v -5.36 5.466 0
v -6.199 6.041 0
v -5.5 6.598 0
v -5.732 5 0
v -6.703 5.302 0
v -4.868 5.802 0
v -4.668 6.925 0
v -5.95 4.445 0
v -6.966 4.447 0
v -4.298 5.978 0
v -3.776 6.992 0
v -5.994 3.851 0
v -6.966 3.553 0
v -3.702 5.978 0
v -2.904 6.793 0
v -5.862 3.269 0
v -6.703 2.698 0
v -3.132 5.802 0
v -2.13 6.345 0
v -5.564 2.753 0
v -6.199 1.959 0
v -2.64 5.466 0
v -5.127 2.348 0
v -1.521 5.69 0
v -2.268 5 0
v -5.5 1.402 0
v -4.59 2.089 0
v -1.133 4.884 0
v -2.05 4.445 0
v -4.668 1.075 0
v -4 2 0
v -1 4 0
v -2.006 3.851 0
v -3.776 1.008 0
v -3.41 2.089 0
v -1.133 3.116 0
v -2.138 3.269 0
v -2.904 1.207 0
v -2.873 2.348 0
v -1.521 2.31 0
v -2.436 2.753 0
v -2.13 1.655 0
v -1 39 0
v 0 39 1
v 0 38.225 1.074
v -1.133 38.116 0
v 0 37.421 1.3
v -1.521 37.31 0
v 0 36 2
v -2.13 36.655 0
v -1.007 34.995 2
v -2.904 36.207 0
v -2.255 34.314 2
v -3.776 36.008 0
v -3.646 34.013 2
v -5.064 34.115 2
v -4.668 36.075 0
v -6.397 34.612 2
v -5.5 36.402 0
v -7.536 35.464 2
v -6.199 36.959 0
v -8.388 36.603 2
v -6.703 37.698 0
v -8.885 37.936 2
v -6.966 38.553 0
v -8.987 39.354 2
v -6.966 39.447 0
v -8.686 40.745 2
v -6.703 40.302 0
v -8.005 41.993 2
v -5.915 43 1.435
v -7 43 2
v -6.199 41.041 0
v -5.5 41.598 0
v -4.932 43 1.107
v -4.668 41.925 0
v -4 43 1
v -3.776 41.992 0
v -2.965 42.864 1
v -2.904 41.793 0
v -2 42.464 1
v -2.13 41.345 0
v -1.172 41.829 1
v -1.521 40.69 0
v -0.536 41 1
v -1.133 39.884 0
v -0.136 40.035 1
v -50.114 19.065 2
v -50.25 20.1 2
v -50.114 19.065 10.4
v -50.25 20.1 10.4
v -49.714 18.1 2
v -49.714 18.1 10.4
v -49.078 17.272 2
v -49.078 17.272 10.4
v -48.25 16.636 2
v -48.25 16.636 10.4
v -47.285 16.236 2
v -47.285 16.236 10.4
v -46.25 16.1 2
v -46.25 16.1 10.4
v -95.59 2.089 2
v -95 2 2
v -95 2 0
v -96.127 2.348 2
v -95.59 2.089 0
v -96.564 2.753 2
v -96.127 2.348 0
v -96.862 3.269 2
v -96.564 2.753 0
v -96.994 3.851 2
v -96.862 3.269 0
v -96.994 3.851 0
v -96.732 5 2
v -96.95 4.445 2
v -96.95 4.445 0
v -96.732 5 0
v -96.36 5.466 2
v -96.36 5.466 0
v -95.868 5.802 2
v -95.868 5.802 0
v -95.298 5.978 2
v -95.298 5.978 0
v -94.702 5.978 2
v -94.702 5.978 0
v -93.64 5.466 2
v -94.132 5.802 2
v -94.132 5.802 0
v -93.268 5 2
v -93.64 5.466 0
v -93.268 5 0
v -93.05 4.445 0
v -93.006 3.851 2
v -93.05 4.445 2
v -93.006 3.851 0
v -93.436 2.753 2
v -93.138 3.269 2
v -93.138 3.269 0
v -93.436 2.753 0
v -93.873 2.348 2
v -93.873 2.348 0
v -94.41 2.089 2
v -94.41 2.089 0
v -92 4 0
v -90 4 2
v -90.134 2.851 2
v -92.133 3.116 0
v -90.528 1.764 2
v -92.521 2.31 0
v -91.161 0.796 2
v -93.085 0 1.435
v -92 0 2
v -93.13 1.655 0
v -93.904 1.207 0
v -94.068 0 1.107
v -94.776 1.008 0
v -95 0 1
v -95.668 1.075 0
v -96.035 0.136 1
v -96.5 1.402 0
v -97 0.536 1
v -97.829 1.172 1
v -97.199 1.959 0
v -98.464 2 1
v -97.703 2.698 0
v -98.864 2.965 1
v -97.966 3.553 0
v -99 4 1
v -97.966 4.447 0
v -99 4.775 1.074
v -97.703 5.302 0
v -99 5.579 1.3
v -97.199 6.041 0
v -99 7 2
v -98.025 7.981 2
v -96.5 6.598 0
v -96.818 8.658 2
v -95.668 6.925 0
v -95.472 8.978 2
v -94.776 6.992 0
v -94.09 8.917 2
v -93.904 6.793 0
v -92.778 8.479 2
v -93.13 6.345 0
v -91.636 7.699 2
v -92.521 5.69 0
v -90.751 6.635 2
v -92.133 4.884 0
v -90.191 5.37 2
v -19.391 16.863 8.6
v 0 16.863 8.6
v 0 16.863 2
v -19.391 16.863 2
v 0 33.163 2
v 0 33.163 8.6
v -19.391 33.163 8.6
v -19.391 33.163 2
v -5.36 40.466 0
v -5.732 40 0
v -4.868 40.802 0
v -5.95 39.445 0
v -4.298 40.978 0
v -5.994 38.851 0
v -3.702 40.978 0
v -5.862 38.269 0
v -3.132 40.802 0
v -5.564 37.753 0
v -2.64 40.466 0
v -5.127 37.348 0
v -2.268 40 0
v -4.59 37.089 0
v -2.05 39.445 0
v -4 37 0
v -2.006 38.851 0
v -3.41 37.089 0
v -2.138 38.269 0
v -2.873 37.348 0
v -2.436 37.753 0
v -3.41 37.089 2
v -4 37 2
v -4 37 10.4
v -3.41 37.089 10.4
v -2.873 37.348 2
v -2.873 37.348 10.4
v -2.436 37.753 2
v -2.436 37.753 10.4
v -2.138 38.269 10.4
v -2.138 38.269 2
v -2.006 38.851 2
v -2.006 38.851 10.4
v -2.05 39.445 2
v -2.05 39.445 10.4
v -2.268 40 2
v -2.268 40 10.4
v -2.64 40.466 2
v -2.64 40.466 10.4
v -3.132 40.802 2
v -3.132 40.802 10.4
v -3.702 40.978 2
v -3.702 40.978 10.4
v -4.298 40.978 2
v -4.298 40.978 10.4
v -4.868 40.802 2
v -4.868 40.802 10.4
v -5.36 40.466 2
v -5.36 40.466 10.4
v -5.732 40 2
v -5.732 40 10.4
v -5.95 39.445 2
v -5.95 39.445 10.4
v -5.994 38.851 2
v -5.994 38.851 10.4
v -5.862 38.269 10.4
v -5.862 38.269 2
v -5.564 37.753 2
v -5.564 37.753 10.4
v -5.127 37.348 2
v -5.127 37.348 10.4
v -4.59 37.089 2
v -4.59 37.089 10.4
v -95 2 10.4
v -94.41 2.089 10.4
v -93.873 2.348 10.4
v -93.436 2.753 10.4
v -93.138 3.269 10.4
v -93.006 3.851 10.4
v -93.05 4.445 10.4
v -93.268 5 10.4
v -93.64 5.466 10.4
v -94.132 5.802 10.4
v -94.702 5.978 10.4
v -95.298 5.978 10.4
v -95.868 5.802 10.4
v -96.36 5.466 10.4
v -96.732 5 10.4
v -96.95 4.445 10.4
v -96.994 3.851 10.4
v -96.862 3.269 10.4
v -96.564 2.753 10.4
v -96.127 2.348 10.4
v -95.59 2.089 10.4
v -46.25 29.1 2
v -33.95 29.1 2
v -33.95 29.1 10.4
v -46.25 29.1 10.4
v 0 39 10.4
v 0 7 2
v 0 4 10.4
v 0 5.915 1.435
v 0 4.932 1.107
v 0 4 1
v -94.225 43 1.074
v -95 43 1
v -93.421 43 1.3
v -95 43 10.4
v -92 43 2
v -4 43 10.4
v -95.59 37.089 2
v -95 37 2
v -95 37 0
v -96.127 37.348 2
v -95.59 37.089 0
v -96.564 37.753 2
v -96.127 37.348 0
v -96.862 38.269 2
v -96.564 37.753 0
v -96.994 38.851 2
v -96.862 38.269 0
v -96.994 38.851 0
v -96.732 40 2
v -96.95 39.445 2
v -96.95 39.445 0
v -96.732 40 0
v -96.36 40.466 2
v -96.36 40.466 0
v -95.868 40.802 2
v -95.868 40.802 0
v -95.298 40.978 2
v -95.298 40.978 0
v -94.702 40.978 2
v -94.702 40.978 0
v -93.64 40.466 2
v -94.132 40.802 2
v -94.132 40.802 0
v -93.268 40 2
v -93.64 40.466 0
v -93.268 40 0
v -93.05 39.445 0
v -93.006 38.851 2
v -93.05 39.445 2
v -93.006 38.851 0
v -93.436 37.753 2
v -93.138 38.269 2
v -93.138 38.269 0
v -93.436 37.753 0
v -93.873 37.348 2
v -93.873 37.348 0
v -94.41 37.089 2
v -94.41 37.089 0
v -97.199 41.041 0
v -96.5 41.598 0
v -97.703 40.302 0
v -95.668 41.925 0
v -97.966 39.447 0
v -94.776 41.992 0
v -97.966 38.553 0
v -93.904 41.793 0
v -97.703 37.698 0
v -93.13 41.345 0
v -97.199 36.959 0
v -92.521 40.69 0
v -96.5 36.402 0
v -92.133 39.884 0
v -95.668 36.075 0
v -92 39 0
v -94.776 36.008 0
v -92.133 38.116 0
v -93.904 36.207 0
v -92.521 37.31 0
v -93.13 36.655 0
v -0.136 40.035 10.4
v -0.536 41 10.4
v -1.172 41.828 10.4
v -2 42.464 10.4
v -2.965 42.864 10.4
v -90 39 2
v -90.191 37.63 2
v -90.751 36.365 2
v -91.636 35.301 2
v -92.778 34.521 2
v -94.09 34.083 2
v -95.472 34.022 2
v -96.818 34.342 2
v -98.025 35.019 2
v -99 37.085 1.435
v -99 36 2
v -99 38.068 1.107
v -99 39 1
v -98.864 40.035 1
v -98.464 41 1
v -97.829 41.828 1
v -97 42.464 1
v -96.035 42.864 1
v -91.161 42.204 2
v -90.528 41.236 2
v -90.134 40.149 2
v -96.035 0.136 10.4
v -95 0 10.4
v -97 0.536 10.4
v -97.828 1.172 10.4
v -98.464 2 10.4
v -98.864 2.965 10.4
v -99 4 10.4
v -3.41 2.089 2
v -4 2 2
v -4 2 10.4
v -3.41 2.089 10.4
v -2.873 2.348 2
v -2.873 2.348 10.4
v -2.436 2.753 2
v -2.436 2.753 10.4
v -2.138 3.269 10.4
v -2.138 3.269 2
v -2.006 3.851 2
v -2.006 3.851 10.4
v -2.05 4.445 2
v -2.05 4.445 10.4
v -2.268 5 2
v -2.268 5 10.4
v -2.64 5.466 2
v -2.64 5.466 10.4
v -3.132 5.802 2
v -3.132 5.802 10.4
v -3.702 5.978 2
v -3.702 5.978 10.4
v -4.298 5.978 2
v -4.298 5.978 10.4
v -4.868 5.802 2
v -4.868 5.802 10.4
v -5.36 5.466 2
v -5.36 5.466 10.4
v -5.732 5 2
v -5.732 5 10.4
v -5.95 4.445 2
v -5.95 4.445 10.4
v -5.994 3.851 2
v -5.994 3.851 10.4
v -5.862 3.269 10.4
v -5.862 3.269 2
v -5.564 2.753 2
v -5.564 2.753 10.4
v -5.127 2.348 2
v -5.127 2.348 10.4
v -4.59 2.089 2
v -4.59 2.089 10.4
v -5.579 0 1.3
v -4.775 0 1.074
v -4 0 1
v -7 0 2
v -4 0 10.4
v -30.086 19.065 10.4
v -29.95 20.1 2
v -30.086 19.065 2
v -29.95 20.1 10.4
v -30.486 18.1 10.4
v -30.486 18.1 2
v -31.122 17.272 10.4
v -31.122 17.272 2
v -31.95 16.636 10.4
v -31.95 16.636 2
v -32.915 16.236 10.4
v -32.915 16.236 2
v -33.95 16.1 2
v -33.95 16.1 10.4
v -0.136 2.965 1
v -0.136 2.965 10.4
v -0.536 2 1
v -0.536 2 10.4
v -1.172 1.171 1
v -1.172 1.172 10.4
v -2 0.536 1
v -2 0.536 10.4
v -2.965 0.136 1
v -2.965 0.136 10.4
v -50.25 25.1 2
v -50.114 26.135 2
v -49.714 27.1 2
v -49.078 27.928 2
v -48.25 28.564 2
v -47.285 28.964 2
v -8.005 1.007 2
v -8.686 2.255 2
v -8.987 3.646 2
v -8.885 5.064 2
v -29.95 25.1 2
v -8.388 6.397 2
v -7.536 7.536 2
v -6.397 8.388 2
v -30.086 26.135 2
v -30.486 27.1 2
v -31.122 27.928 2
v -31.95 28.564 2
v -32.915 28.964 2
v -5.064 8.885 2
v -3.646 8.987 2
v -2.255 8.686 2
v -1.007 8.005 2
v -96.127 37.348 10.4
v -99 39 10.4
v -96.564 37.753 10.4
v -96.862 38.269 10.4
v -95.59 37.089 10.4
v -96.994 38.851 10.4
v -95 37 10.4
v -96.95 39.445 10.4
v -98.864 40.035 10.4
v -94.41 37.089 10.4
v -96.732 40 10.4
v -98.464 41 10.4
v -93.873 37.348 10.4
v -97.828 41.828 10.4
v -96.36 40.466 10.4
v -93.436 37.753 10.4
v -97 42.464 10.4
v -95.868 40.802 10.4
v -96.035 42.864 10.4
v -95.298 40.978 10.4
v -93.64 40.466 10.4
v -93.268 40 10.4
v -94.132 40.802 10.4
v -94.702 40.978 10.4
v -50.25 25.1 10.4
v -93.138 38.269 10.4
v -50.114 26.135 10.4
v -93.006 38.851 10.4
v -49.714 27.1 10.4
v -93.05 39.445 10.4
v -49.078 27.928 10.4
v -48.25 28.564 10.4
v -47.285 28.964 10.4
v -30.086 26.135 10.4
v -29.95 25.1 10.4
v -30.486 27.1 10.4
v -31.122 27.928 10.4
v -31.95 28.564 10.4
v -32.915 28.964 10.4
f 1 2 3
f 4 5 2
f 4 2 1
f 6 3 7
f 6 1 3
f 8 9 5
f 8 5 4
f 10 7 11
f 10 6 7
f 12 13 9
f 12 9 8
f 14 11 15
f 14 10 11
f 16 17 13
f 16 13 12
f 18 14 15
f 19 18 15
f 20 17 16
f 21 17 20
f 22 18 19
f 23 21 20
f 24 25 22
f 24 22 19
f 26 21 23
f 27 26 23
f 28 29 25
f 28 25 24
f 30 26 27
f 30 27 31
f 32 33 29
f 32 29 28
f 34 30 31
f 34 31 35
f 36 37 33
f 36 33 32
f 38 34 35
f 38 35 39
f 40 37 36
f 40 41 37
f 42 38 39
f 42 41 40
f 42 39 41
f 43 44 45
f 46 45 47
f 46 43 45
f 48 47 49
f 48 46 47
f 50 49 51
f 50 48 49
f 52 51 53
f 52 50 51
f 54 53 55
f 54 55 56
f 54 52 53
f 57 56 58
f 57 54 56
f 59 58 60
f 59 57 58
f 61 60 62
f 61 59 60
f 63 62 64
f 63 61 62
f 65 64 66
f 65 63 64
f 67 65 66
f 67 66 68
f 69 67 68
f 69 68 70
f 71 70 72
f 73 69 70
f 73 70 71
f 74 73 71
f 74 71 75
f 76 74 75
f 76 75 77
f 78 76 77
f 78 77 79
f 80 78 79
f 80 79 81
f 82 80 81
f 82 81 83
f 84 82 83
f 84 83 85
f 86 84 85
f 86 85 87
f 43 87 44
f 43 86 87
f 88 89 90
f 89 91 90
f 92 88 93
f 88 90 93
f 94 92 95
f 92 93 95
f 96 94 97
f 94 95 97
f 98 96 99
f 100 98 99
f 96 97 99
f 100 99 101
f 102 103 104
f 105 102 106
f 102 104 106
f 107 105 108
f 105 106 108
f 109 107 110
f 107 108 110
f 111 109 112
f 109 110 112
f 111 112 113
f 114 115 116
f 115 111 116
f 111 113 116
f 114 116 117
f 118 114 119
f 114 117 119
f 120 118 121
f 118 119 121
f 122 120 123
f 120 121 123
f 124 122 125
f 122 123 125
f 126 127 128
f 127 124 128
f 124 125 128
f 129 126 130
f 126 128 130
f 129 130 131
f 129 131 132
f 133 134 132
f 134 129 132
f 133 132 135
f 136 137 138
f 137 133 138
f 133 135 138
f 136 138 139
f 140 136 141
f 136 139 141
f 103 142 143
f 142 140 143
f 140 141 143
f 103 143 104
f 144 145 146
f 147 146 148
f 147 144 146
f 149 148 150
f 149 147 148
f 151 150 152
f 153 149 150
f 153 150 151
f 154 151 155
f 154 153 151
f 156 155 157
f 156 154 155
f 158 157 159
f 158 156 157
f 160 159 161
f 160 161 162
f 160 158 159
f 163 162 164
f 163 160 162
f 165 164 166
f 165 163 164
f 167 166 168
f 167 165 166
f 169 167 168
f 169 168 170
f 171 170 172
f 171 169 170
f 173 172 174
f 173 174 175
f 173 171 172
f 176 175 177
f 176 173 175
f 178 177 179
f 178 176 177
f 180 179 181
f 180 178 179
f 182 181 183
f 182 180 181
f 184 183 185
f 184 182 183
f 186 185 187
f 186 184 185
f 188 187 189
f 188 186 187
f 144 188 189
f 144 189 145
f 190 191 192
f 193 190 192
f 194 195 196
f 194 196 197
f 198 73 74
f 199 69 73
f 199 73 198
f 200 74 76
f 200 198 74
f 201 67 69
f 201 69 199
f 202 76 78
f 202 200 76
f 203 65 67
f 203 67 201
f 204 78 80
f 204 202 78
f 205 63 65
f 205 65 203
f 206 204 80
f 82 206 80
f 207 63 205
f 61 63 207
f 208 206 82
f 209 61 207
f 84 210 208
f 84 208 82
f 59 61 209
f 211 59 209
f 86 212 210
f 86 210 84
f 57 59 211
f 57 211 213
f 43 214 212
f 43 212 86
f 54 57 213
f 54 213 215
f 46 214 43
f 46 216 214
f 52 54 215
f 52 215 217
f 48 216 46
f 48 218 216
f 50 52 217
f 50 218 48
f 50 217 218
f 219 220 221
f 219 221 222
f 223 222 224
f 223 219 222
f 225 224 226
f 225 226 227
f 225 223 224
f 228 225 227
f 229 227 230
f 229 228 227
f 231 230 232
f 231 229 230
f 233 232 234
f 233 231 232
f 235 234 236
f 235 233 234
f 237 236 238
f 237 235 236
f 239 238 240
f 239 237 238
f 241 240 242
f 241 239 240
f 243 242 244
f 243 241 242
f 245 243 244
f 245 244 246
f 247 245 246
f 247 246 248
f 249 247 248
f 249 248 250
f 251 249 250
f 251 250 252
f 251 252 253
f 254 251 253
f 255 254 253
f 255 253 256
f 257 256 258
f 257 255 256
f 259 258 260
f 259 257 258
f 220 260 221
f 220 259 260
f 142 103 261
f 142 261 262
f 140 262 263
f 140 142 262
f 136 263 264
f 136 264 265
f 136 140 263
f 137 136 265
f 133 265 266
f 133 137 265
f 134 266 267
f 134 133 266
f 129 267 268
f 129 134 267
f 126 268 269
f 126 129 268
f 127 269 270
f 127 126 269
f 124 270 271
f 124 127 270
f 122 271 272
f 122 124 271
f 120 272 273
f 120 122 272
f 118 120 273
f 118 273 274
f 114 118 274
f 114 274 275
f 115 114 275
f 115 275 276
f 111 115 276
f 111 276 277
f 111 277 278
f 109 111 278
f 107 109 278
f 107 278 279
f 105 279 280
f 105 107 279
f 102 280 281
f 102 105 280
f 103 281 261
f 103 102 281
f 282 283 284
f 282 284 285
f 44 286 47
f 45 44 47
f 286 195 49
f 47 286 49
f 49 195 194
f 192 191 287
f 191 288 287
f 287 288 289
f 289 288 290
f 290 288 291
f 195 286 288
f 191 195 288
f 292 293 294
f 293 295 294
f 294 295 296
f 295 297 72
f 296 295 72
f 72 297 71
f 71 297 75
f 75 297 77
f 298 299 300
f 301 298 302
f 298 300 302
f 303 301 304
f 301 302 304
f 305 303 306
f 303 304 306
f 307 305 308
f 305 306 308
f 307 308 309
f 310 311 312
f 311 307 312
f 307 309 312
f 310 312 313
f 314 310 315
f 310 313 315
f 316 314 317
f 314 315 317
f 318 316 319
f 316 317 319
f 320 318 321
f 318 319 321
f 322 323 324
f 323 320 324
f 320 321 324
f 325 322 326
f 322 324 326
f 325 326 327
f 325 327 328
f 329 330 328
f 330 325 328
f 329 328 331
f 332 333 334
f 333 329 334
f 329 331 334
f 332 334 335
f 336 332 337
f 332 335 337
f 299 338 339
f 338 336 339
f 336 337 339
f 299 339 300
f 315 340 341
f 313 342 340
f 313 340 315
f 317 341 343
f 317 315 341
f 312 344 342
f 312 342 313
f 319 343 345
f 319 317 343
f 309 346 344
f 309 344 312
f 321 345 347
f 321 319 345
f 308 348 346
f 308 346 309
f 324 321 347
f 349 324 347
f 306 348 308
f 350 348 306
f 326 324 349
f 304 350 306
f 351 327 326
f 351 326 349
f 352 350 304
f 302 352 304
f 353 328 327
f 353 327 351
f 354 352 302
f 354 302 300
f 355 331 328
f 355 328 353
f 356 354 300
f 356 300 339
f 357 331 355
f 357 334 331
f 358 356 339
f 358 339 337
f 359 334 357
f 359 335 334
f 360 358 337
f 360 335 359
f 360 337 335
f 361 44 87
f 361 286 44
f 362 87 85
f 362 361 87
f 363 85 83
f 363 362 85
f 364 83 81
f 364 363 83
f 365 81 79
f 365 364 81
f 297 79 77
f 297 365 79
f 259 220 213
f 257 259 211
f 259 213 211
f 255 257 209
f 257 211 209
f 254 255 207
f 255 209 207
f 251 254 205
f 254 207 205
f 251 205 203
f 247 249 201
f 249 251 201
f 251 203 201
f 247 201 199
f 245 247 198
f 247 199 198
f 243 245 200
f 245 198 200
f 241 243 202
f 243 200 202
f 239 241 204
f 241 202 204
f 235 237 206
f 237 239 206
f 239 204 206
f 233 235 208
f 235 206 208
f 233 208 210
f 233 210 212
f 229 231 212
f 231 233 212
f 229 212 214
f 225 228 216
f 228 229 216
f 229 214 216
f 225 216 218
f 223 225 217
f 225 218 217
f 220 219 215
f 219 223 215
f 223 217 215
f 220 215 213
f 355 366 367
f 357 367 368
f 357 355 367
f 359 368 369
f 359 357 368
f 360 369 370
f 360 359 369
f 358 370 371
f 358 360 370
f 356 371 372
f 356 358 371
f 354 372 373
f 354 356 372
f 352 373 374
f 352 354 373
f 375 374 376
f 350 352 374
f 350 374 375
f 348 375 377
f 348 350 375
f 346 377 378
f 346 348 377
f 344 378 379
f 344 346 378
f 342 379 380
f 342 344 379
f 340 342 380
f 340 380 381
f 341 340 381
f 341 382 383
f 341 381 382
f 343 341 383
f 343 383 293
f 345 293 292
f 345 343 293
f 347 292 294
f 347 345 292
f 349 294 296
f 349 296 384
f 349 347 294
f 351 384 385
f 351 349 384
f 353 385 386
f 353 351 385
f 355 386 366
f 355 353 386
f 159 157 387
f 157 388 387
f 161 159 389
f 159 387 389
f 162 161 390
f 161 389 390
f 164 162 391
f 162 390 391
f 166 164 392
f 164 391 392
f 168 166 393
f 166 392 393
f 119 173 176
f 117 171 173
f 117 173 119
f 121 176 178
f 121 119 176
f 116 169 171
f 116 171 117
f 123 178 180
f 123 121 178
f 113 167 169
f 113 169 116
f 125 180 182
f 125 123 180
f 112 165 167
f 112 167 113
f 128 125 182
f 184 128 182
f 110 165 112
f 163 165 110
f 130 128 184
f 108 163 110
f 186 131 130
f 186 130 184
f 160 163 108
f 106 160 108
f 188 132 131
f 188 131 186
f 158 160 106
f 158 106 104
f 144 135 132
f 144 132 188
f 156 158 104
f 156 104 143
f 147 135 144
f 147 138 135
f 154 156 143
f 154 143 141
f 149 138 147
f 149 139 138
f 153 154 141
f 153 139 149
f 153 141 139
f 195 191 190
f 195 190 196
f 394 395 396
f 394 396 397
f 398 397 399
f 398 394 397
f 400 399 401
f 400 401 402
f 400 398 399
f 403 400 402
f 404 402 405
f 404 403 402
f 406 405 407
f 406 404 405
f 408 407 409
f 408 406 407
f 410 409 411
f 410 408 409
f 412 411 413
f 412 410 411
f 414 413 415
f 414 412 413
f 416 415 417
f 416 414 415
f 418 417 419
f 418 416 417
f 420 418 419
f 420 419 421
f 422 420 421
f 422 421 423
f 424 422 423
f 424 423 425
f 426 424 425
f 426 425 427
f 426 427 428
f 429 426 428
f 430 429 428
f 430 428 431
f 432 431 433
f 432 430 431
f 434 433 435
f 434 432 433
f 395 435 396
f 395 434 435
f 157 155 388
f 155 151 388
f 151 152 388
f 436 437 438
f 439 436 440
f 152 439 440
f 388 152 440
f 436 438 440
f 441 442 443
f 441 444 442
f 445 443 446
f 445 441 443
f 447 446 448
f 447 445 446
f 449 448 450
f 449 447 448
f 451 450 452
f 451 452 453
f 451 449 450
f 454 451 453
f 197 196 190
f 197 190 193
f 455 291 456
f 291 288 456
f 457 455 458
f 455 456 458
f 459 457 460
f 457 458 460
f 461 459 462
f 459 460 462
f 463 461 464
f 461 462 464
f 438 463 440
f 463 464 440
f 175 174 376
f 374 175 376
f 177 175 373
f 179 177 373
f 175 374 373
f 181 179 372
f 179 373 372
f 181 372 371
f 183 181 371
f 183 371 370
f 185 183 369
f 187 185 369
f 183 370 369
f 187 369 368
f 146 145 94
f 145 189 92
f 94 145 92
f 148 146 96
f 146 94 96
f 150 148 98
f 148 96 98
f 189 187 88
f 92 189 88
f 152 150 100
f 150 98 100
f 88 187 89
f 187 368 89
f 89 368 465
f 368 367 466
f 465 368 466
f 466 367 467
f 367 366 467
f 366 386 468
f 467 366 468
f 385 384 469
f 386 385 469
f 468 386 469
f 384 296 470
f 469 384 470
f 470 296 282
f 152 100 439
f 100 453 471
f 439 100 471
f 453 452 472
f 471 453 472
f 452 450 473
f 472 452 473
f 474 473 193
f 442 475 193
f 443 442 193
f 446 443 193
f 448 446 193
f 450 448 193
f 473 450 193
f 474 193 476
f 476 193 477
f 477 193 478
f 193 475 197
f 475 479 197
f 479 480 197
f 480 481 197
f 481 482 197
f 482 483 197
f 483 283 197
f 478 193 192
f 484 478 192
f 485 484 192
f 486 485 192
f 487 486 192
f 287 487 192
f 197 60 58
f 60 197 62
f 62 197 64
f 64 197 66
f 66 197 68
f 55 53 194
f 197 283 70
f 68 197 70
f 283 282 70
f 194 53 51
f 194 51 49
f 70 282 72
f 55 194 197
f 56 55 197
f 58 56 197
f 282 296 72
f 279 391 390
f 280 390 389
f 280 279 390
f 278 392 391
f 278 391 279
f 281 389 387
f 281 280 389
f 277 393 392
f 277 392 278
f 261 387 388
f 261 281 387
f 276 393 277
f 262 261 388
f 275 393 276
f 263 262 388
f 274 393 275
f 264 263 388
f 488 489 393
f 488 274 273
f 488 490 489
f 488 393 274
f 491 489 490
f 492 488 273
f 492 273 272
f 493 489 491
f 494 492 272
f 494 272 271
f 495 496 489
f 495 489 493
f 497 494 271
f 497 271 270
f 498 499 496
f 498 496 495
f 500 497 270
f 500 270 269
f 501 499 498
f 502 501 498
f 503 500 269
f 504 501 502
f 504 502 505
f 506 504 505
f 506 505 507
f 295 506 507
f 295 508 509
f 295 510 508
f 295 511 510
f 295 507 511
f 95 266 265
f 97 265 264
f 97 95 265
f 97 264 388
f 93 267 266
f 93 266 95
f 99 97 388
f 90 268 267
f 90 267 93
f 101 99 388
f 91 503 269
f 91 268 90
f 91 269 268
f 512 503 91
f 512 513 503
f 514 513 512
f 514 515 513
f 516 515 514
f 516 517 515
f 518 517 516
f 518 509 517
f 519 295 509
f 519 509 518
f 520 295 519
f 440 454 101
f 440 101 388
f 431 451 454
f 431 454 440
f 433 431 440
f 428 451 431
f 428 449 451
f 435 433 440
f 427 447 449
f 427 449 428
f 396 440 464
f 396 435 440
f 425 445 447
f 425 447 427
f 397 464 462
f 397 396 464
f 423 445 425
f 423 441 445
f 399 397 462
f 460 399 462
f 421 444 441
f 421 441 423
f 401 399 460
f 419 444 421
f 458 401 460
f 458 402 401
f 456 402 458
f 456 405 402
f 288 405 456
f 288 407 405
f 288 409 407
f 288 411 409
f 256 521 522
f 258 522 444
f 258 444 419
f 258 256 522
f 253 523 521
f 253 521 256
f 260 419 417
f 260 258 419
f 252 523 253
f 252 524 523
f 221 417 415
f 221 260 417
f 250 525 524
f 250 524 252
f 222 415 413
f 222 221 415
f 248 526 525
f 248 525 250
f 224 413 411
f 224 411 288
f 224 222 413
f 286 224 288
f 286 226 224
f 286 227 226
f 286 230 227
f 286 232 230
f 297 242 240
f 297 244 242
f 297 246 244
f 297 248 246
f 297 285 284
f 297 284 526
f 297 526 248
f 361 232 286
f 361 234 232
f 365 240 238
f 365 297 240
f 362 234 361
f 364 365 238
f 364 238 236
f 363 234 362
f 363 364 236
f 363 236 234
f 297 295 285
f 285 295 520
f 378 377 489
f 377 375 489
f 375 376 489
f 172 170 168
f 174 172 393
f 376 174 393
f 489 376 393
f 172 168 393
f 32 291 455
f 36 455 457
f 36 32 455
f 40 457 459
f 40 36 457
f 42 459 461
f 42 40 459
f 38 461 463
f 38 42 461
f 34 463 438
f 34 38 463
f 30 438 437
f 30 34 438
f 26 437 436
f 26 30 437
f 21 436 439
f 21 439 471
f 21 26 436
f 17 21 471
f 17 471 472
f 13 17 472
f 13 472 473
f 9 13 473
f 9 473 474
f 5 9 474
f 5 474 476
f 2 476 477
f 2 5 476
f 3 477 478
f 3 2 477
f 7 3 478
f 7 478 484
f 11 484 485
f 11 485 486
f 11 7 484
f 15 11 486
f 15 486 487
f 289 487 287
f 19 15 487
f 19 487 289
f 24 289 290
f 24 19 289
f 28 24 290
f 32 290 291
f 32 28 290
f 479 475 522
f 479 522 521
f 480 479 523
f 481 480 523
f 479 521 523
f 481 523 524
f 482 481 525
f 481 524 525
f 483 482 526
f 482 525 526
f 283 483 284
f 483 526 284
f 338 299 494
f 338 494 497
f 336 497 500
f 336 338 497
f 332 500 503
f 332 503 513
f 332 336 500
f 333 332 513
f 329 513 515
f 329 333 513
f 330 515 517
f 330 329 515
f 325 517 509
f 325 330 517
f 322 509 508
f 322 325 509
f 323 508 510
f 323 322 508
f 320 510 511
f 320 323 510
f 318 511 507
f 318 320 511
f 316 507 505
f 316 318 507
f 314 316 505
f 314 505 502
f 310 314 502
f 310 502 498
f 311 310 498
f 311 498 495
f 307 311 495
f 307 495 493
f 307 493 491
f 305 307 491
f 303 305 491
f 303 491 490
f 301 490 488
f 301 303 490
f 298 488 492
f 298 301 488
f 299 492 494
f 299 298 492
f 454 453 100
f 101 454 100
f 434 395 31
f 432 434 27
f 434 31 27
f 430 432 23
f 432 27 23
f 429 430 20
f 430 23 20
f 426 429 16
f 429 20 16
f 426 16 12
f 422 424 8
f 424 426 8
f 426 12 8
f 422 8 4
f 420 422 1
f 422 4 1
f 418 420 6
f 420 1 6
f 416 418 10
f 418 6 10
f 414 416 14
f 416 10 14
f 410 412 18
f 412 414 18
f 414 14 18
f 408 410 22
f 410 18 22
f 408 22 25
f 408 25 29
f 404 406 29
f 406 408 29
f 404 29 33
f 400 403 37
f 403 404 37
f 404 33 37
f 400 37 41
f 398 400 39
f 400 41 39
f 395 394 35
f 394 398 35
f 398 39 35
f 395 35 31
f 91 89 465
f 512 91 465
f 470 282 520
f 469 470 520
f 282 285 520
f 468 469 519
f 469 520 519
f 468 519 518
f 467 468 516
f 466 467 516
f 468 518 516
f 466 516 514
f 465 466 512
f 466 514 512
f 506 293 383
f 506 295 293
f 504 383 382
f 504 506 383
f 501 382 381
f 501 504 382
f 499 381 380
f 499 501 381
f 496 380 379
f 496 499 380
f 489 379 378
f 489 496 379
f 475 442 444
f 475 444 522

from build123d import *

# Parameters (mm, degrees)
SKETCH3_W           = 99
SKETCH3_H           = 43
SKETCH3_R           = 2
BOSS_EXTRUDE2_DEPTH = 8.399995141
BOSS_EXTRUDE3_START = 2
SKETCH4_R           = 3
SKETCH4_R_2         = 2
BOSS_EXTRUDE3_DEPTH = 2
CHAMFER1_SIZE       = 2
SKETCH5_W           = 8.599999433
SKETCH5_H           = 16.3
CUT_EXTRUDE1_DEPTH  = 19.390997243
CUT_EXTRUDE2_REACH  = 110.262
SKETCH6_W           = 20.299990895
SKETCH6_H           = 13.000003078
FILLET1_R           = 4


# Some blends are built 0.0001 mm under size
with BuildPart() as part:
    # Sketch3 → Boss-Extrude2 (new body)
    with BuildSketch(Plane.XY.offset(2)):
        with Locations((-49.5, 21.5)):
            Rectangle(SKETCH3_W, SKETCH3_H)
        with Locations(Location((-95, 39, 0), (0, 0, 270))):
            Circle(SKETCH3_R, mode=Mode.SUBTRACT)
        with Locations(Location((-95, 4, 0), (0, 0, 270))):
            Circle(SKETCH3_R, mode=Mode.SUBTRACT)
        with Locations(Location((-4, 4, 0), (0, 0, 270))):
            Circle(SKETCH3_R, mode=Mode.SUBTRACT)
        with Locations(Location((-4, 39, 0), (0, 0, 270))):
            Circle(SKETCH3_R, mode=Mode.SUBTRACT)
    extrude(amount=BOSS_EXTRUDE2_DEPTH)

    # Sketch4 → Boss-Extrude3 (add)
    # profile 1 of 4: a face of its own
    with BuildSketch(Plane(origin=(0, 0, 2), x_dir=(-1, 0, 0), z_dir=(0, 0, -1)).offset(BOSS_EXTRUDE3_START)):
        with Locations(Location((4, 39, 0), (0, 0, 180))):
            Circle(SKETCH4_R)
        with Locations(Location((4, 39, 0), (0, 0, 270))):
            Circle(SKETCH4_R_2, mode=Mode.SUBTRACT)
    # profile 2 of 4: a face of its own
    with BuildSketch(Plane(origin=(0, 0, 2), x_dir=(-1, 0, 0), z_dir=(0, 0, -1)).offset(BOSS_EXTRUDE3_START)):
        with Locations(Location((95, 39, 0), (0, 0, 180))):
            Circle(SKETCH4_R)
        with Locations(Location((95, 39, 0), (0, 0, 270))):
            Circle(SKETCH4_R_2, mode=Mode.SUBTRACT)
    # profile 3 of 4: a face of its own
    with BuildSketch(Plane(origin=(0, 0, 2), x_dir=(-1, 0, 0), z_dir=(0, 0, -1)).offset(BOSS_EXTRUDE3_START)):
        with Locations(Location((95, 4, 0), (0, 0, 180))):
            Circle(SKETCH4_R)
        with Locations(Location((95, 4, 0), (0, 0, 270))):
            Circle(SKETCH4_R_2, mode=Mode.SUBTRACT)
    # profile 4 of 4: a face of its own
    with BuildSketch(Plane(origin=(0, 0, 2), x_dir=(-1, 0, 0), z_dir=(0, 0, -1)).offset(BOSS_EXTRUDE3_START)):
        with Locations(Location((4, 4, 0), (0, 0, 180))):
            Circle(SKETCH4_R)
        with Locations(Location((4, 4, 0), (0, 0, 270))):
            Circle(SKETCH4_R_2, mode=Mode.SUBTRACT)
    extrude(amount=-BOSS_EXTRUDE3_DEPTH)

    # Chamfer1
    # the kernel refuses this chamfer: 2 mm, written as the material it adds along each edge
    with BuildSketch(Plane(origin=(-4, 39, 2), x_dir=(1, 0, 0), z_dir=(0, 1, 0))) as chamfer1_piece_1_section:
        Polygon((3 + CHAMFER1_SIZE, 0), (3, CHAMFER1_SIZE), (3, 0), align=None)
    chamfer1_piece_1 = revolve(axis=Axis((-4, 39, 2), (0, 0, -1)), mode=Mode.PRIVATE)
    chamfer1_piece_1 = split(chamfer1_piece_1, bisect_by=Plane(origin=(-8.002812408, 43, 1.053756135), z_dir=(0, -1, 0)), keep=Keep.TOP, mode=Mode.PRIVATE)
    chamfer1_piece_1 = split(chamfer1_piece_1, bisect_by=Plane(origin=(0, 39, 1.053756135), z_dir=(-1, 0, 0)), keep=Keep.TOP, mode=Mode.PRIVATE)
    chamfer1_piece_1 = split(chamfer1_piece_1, bisect_by=Plane(origin=(-8.002812408, 39, 0), z_dir=(0, 0, 1)), keep=Keep.TOP, mode=Mode.PRIVATE)
    add(chamfer1_piece_1)
    with BuildSketch(Plane(origin=(-95, 39, 2), x_dir=(1, 0, 0), z_dir=(0, 1, 0))) as chamfer1_piece_2_section:
        Polygon((3 + CHAMFER1_SIZE, 0), (3, CHAMFER1_SIZE), (3, 0), align=None)
    chamfer1_piece_2 = revolve(axis=Axis((-95, 39, 2), (0, 0, -1)), mode=Mode.PRIVATE)
    chamfer1_piece_2 = split(chamfer1_piece_2, bisect_by=Plane(origin=(-92.655832372, 43, 1.739278981), z_dir=(0, -1, 0)), keep=Keep.TOP, mode=Mode.PRIVATE)
    chamfer1_piece_2 = split(chamfer1_piece_2, bisect_by=Plane(origin=(-99, 34.939782567, 1.739278981), z_dir=(1, 0, 0)), keep=Keep.TOP, mode=Mode.PRIVATE)
    chamfer1_piece_2 = split(chamfer1_piece_2, bisect_by=Plane(origin=(-92.655832372, 34.939782567, 0), z_dir=(0, 0, 1)), keep=Keep.TOP, mode=Mode.PRIVATE)
    add(chamfer1_piece_2)
    with BuildSketch(Plane(origin=(-95, 4, 2), x_dir=(1, 0, 0), z_dir=(0, 1, 0))) as chamfer1_piece_3_section:
        Polygon((3 + CHAMFER1_SIZE, 0), (3, CHAMFER1_SIZE), (3, 0), align=None)
    chamfer1_piece_3 = revolve(axis=Axis((-95, 4, 2), (0, 0, -1)), mode=Mode.PRIVATE)
    chamfer1_piece_3 = split(chamfer1_piece_3, bisect_by=Plane(origin=(-99, 0.533462766, 1.053756132), z_dir=(1, 0, 0)), keep=Keep.TOP, mode=Mode.PRIVATE)
    chamfer1_piece_3 = split(chamfer1_piece_3, bisect_by=Plane(origin=(-92.998593795, 0, 1.053756132), z_dir=(0, 1, 0)), keep=Keep.TOP, mode=Mode.PRIVATE)
    chamfer1_piece_3 = split(chamfer1_piece_3, bisect_by=Plane(origin=(-92.998593795, 0.533462766, 0), z_dir=(0, 0, 1)), keep=Keep.TOP, mode=Mode.PRIVATE)
    add(chamfer1_piece_3)
    with BuildSketch(Plane(origin=(-4, 4, 2), x_dir=(1, 0, 0), z_dir=(0, 1, 0))) as chamfer1_piece_4_section:
        Polygon((3 + CHAMFER1_SIZE, 0), (3, CHAMFER1_SIZE), (3, 0), align=None)
    chamfer1_piece_4 = revolve(axis=Axis((-4, 4, 2), (0, 0, -1)), mode=Mode.PRIVATE)
    chamfer1_piece_4 = split(chamfer1_piece_4, bisect_by=Plane(origin=(0, 4, 1.053756135), z_dir=(-1, 0, 0)), keep=Keep.TOP, mode=Mode.PRIVATE)
    chamfer1_piece_4 = split(chamfer1_piece_4, bisect_by=Plane(origin=(-8.002812408, 0, 1.053756135), z_dir=(0, 1, 0)), keep=Keep.TOP, mode=Mode.PRIVATE)
    chamfer1_piece_4 = split(chamfer1_piece_4, bisect_by=Plane(origin=(-8.002812408, 4, 0), z_dir=(0, 0, 1)), keep=Keep.TOP, mode=Mode.PRIVATE)
    add(chamfer1_piece_4)

    # Sketch5 → Cut-Extrude1 (cut)
    with BuildSketch(Plane(origin=(0, 0, 0), x_dir=(0, 0, -1), z_dir=(1, 0, 0))):
        with Locations((-4.299999717, 25.013003939)):
            Rectangle(SKETCH5_W, SKETCH5_H)
    extrude(amount=-CUT_EXTRUDE1_DEPTH, mode=Mode.SUBTRACT)

    # Sketch6 → Cut-Extrude2 (cut, up to next)
    with BuildSketch(Plane(origin=(0, 0, 2), x_dir=(-1, 0, 0), z_dir=(0, 0, -1)), mode=Mode.PRIVATE) as cut_extrude2_sk1:
        with Locations((40.099996563, 22.600000838)):
            Rectangle(SKETCH6_W, SKETCH6_H)
    cut_extrude2_tool1 = extrude(cut_extrude2_sk1.sketch, amount=-CUT_EXTRUDE2_REACH, mode=Mode.PRIVATE) & part.part
    add(cut_extrude2_tool1.solids().sort_by_distance((-40.099997, 22.600001, 2))[0], mode=Mode.SUBTRACT)

    # Fillet1
    fillet1_edges = [part.edges().sort_by_distance(p)[0] for p in [
        (-50.249992011, 16.099999299, 6.19999757),
        (-50.249992011, 29.100002377, 6.19999757),
        (-29.950001116, 29.100002377, 6.19999757),
        (-29.950001116, 16.099999299, 6.19999757),
        (-99, 0, 6.19999757),
        (0, 0, 6.19999757),
        (0, 43, 6.19999757),
        (-99, 43, 6.19999757),
    ]]
    fillet(fillet1_edges, radius=FILLET1_R - 0.0001)  # a hair under: the kernel refuses the full size


solid = part.part
